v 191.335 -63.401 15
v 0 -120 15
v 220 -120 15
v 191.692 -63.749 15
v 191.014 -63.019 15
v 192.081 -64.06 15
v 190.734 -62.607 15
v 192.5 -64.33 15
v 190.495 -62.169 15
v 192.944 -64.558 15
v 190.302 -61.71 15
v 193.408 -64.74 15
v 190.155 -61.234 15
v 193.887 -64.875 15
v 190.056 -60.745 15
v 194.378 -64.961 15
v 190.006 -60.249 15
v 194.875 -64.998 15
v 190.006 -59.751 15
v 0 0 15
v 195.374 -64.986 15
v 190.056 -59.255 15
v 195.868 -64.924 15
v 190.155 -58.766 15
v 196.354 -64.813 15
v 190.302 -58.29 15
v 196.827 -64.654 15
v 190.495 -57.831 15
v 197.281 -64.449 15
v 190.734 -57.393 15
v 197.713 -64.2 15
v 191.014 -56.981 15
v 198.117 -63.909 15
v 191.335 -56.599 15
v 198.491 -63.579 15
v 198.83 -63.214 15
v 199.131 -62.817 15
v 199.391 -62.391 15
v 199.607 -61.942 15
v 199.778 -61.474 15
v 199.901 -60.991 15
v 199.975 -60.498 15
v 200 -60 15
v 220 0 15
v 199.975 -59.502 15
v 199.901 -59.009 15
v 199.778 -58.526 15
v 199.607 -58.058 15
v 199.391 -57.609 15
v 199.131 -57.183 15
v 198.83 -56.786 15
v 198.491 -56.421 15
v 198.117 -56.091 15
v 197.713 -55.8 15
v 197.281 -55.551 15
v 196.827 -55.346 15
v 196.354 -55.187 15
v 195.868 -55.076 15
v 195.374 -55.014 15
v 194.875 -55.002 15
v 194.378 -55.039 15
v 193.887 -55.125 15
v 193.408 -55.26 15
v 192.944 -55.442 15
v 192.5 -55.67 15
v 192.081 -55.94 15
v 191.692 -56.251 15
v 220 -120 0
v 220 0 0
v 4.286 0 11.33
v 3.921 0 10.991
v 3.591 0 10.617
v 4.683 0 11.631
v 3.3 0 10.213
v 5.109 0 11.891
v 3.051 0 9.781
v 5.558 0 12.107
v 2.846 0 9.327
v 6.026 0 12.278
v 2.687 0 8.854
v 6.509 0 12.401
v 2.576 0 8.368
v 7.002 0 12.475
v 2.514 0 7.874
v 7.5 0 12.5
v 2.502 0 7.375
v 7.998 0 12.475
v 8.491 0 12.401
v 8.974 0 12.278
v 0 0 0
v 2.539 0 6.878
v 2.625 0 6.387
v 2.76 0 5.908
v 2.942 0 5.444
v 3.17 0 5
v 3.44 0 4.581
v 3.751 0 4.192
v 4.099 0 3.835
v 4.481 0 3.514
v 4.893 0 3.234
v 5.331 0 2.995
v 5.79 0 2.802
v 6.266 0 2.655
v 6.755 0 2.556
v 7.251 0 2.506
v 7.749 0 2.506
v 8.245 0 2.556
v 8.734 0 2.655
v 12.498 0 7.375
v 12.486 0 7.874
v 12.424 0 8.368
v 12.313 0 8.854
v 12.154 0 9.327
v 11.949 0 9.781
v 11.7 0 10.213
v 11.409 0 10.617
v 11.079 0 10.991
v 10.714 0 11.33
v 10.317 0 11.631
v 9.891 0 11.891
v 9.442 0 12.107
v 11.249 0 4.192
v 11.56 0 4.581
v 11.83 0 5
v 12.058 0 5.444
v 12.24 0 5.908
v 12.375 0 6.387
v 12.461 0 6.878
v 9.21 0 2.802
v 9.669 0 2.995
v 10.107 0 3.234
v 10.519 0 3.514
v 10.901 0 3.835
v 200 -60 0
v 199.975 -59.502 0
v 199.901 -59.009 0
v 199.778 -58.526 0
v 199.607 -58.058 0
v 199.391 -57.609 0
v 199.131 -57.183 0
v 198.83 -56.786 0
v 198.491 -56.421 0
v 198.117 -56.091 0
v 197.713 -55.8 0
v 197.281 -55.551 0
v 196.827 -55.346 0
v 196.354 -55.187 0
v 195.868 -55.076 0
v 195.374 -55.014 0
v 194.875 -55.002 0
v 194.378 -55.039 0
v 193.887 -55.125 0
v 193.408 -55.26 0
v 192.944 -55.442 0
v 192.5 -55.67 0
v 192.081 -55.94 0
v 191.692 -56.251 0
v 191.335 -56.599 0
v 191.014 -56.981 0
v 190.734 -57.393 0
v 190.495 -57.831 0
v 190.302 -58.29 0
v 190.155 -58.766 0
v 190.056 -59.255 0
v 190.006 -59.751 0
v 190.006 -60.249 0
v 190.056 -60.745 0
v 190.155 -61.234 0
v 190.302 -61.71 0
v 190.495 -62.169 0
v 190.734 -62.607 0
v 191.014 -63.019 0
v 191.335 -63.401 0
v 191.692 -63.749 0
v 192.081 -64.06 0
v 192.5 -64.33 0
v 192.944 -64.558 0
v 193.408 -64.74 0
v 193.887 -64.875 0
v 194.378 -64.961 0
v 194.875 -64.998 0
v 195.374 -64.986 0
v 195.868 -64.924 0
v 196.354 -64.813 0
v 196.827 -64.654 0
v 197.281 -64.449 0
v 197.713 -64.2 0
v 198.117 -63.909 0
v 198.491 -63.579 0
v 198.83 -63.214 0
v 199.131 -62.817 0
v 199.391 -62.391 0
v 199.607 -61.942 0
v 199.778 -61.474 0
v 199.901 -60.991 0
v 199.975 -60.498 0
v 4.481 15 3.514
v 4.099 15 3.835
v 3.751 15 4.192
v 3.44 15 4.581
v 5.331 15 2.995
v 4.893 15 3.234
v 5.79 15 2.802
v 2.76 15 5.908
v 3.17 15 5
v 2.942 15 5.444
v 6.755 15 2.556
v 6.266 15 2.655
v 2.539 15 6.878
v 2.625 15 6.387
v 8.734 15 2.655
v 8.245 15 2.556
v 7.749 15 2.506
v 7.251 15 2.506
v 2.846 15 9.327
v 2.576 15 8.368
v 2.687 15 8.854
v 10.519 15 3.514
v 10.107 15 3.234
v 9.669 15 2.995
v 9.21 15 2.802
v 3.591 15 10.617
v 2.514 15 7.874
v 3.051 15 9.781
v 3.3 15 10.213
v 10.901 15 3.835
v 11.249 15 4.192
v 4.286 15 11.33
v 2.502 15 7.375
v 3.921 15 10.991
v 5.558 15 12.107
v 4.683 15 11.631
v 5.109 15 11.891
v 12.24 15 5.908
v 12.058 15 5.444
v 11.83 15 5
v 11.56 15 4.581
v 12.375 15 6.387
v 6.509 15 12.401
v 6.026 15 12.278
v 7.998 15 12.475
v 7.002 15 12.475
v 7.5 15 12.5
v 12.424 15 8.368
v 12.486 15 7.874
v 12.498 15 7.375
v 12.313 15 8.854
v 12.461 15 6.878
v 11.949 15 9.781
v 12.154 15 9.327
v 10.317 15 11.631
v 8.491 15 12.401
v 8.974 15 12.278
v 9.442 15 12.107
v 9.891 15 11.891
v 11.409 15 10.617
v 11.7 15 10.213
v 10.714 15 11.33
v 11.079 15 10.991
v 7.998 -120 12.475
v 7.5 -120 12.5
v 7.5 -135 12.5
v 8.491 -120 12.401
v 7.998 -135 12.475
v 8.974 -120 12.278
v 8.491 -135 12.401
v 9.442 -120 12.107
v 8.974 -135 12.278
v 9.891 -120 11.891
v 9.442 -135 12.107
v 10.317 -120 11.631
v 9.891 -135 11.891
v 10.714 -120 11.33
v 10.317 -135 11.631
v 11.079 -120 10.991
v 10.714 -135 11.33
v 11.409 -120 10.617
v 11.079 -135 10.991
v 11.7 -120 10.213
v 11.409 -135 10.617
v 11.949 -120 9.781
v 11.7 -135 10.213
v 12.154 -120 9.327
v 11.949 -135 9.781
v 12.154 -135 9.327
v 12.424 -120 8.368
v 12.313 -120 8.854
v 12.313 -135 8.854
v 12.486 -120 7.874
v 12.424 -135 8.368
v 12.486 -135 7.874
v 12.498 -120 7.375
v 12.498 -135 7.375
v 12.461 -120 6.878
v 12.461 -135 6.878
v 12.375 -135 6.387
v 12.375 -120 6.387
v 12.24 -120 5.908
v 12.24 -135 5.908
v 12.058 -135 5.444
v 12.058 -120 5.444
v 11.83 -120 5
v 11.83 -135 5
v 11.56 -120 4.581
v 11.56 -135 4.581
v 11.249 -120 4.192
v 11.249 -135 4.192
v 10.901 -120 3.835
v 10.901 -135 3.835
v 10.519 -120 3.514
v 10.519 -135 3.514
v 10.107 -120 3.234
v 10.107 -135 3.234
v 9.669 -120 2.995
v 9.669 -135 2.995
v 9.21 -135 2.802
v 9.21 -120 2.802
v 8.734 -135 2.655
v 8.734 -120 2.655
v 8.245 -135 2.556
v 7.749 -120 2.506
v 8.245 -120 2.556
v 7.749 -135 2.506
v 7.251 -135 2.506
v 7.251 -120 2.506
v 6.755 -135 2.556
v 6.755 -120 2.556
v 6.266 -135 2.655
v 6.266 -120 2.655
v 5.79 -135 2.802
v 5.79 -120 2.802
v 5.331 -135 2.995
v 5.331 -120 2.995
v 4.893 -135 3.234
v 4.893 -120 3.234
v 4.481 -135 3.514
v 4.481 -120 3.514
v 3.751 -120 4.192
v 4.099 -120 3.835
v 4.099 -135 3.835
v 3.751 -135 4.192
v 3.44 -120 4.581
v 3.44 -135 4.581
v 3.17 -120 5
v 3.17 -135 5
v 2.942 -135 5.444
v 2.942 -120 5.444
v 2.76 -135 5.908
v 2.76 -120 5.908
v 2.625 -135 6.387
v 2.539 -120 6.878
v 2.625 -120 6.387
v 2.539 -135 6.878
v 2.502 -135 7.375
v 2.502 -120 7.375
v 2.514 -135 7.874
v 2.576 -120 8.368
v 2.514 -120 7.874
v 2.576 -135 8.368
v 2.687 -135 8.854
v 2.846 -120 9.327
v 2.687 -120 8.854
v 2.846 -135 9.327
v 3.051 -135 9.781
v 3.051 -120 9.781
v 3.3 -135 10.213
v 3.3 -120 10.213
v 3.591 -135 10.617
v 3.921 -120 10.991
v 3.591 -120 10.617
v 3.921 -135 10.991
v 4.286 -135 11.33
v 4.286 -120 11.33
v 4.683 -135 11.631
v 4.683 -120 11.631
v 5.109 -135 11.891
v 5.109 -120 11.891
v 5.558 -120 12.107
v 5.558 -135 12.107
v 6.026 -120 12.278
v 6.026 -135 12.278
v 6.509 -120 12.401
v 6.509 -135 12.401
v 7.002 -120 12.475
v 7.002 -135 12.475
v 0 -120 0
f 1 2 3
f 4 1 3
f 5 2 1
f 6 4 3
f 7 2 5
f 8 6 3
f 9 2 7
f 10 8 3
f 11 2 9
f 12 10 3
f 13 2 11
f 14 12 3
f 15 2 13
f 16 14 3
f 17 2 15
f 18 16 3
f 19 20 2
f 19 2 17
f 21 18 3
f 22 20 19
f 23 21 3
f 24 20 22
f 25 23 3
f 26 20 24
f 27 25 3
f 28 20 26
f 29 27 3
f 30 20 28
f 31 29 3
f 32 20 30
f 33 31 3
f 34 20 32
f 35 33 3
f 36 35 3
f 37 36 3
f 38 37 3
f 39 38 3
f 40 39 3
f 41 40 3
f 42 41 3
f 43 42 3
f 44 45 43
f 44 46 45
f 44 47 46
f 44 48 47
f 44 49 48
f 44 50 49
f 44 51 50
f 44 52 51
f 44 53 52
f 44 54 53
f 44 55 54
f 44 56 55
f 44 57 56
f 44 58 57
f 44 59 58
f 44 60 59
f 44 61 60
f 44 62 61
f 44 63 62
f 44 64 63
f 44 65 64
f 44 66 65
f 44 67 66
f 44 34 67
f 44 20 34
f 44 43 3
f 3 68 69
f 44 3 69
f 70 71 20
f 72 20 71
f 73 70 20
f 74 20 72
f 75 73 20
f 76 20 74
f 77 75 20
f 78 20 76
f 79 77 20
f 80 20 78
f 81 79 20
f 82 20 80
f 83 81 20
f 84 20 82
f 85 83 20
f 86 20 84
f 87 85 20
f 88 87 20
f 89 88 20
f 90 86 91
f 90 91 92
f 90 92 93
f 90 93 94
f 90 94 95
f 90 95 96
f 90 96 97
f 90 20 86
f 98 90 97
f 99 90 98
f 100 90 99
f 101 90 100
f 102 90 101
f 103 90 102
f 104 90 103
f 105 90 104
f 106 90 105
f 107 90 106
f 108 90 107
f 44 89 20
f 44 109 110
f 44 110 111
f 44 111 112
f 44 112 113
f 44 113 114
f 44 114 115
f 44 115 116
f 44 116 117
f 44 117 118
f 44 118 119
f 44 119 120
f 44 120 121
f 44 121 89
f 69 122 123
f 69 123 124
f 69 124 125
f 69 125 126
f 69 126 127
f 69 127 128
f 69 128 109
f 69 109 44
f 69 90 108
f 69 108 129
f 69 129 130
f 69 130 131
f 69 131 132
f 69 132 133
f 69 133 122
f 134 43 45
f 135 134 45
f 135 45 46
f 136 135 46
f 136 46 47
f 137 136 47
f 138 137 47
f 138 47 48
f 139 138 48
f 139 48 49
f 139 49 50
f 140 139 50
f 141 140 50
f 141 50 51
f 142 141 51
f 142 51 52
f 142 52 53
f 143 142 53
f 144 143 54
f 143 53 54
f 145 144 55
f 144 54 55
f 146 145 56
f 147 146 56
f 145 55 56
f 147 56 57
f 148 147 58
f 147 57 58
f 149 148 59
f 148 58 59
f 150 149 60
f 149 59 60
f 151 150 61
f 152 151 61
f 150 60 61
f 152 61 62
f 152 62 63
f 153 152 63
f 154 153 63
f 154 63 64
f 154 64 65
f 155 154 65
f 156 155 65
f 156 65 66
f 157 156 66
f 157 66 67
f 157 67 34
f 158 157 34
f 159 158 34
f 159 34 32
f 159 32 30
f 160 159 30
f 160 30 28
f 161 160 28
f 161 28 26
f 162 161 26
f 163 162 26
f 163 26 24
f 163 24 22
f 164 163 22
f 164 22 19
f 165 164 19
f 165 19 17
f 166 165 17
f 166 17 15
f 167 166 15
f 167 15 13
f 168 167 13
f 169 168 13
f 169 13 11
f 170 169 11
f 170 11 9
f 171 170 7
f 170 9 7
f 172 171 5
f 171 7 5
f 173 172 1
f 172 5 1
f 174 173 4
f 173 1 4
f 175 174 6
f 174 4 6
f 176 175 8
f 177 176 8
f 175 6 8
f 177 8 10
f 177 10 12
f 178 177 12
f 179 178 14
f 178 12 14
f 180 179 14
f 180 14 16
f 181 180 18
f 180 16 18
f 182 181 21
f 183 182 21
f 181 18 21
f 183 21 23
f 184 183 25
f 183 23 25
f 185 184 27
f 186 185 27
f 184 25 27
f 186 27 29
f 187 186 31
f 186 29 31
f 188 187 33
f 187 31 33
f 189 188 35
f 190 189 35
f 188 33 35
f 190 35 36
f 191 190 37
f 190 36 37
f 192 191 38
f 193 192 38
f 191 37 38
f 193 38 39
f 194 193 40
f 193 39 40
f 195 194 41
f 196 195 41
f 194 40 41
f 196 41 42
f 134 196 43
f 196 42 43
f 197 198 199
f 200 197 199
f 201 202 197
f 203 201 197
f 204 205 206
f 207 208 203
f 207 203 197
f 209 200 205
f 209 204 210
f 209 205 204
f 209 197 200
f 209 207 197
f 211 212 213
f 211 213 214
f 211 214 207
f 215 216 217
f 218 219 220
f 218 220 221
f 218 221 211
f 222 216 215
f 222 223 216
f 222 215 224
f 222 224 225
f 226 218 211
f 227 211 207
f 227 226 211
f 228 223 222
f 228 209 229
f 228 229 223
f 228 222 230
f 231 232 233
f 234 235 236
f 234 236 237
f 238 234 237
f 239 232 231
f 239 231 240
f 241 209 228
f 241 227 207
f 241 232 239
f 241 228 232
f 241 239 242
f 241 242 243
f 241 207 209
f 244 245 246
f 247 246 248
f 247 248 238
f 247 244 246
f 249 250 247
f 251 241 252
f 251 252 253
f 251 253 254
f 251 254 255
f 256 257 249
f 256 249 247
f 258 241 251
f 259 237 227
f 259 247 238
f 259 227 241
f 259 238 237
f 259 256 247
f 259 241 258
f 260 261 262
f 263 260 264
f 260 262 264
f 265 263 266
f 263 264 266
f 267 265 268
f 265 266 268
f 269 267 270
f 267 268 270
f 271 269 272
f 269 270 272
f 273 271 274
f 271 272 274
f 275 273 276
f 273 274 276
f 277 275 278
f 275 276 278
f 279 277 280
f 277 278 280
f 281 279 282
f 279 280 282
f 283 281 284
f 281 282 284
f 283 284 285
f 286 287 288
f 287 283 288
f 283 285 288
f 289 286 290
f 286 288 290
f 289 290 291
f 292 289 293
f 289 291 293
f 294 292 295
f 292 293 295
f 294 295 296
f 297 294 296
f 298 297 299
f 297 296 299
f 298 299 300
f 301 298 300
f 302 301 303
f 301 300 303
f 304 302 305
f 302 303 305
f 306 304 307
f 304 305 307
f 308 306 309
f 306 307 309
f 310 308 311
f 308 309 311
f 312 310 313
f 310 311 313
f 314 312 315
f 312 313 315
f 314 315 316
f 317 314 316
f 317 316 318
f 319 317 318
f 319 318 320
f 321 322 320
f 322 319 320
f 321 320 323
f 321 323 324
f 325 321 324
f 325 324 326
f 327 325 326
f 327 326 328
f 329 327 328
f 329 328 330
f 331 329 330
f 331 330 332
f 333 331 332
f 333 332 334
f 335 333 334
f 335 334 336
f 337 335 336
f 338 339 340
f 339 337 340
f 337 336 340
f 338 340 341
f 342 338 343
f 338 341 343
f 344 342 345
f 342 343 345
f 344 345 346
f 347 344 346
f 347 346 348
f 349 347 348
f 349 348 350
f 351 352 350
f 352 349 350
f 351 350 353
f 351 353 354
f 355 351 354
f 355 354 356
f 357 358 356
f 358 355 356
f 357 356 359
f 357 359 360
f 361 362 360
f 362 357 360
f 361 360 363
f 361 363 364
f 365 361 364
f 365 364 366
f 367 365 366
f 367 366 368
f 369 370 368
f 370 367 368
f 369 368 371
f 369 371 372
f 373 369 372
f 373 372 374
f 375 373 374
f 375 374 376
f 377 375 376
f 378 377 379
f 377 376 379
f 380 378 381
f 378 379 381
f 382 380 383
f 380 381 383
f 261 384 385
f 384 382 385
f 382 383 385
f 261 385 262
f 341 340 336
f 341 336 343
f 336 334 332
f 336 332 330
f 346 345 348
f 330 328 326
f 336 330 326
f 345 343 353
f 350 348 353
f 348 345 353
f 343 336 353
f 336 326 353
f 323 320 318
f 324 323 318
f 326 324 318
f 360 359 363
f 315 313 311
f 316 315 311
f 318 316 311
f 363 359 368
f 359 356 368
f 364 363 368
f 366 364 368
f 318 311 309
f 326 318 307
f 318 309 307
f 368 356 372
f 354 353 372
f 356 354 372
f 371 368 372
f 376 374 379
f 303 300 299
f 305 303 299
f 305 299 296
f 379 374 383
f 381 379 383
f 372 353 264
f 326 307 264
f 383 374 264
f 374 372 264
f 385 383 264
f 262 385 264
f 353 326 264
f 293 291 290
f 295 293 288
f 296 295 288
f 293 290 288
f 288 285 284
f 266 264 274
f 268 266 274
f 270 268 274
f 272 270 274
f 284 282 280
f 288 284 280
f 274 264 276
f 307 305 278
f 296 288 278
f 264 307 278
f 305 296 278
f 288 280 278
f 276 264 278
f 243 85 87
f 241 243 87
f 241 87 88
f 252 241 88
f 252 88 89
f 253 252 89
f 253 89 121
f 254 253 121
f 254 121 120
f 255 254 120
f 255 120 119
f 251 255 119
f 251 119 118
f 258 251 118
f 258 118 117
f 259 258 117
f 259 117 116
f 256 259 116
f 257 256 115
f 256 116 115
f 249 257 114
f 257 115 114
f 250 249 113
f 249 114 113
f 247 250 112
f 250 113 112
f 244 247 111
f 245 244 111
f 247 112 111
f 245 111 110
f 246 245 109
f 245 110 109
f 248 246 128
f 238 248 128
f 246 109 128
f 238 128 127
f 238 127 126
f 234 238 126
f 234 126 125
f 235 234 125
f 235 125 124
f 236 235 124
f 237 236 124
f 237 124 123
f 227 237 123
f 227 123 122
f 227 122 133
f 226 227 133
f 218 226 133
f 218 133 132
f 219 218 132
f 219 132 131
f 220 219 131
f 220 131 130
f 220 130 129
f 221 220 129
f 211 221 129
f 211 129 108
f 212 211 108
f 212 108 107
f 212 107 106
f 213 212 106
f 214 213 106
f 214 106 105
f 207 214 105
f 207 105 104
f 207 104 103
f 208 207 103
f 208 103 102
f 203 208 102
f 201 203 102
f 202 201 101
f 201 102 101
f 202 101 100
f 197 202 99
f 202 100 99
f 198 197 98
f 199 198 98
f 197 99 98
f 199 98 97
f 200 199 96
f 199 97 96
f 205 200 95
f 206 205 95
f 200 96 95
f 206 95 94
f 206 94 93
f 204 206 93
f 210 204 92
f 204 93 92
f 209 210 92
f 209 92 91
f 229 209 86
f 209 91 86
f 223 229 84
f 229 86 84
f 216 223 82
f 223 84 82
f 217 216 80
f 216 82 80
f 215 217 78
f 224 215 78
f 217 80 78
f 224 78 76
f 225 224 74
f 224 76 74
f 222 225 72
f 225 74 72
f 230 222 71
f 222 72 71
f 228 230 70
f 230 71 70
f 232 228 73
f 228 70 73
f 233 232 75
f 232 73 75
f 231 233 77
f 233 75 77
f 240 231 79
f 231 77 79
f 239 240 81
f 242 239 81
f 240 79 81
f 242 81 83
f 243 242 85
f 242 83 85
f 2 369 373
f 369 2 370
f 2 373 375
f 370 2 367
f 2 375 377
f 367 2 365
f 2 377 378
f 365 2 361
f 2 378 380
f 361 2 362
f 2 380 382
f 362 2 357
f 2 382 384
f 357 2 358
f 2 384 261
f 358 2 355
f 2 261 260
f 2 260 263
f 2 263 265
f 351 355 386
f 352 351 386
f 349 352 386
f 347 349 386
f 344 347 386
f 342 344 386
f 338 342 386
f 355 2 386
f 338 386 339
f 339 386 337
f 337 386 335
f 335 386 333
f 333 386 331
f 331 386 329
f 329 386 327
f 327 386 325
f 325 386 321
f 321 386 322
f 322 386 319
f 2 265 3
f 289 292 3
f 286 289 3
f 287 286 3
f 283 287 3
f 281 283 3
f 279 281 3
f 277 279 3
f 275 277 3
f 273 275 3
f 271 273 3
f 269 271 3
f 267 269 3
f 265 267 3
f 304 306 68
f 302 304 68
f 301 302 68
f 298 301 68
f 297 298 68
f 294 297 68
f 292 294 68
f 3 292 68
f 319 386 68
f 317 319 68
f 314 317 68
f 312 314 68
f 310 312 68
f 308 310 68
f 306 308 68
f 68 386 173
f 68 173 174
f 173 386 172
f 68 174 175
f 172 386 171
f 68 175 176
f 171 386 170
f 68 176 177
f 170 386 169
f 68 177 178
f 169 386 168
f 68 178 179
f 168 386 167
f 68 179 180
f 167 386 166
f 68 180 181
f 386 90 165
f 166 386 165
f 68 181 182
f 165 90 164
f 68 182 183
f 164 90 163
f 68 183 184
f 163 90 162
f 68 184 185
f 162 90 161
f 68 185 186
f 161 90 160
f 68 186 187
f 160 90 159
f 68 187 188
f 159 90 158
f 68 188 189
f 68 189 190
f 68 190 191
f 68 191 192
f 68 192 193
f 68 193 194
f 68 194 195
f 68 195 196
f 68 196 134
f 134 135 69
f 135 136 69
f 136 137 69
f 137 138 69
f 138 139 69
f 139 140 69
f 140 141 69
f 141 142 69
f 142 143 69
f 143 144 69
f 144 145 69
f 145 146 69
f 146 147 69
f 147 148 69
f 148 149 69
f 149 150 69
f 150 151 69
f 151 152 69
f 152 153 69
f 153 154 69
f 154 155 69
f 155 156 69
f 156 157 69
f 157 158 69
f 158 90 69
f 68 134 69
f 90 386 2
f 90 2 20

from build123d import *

# Parameters (mm, degrees)
SKETCH1_W                = 220
SKETCH1_H                = 120
BOSS_EXTRUDE1_DEPTH      = 15
BOSS_EXTRUDE2_DEPTH      = 15
BOSS_EXTRUDE2_DEPTH_BACK = 135
SKETCH2_R                = 5
SKETCH3_R                = 5
CUT_EXTRUDE1_DEPTH       = 25


with BuildPart() as part:
    # Sketch1 → Boss-Extrude1 (new body)
    with BuildSketch(Plane.XY):
        with Locations((110, -60)):
            Rectangle(SKETCH1_W, SKETCH1_H)
    extrude(amount=BOSS_EXTRUDE1_DEPTH)

    # Sketch2 → Boss-Extrude2 (add, two sides: drawn at the far end of the back side and taken through both)
    with BuildSketch(Plane(origin=(0, 0, 0), x_dir=(1, 0, 0), z_dir=(0, 1, 0)).offset(-BOSS_EXTRUDE2_DEPTH_BACK)):
        with Locations(Location((7.5, -7.5, 0), (0, 0, 270))):
            Circle(SKETCH2_R)
    extrude(amount=BOSS_EXTRUDE2_DEPTH + BOSS_EXTRUDE2_DEPTH_BACK)

    # Sketch3 → Cut-Extrude1 (cut)
    with BuildSketch(Plane.XY.offset(15)):
        with Locations((195, -60)):
            Circle(SKETCH3_R)
    extrude(amount=-CUT_EXTRUDE1_DEPTH, mode=Mode.SUBTRACT)


solid = part.part
